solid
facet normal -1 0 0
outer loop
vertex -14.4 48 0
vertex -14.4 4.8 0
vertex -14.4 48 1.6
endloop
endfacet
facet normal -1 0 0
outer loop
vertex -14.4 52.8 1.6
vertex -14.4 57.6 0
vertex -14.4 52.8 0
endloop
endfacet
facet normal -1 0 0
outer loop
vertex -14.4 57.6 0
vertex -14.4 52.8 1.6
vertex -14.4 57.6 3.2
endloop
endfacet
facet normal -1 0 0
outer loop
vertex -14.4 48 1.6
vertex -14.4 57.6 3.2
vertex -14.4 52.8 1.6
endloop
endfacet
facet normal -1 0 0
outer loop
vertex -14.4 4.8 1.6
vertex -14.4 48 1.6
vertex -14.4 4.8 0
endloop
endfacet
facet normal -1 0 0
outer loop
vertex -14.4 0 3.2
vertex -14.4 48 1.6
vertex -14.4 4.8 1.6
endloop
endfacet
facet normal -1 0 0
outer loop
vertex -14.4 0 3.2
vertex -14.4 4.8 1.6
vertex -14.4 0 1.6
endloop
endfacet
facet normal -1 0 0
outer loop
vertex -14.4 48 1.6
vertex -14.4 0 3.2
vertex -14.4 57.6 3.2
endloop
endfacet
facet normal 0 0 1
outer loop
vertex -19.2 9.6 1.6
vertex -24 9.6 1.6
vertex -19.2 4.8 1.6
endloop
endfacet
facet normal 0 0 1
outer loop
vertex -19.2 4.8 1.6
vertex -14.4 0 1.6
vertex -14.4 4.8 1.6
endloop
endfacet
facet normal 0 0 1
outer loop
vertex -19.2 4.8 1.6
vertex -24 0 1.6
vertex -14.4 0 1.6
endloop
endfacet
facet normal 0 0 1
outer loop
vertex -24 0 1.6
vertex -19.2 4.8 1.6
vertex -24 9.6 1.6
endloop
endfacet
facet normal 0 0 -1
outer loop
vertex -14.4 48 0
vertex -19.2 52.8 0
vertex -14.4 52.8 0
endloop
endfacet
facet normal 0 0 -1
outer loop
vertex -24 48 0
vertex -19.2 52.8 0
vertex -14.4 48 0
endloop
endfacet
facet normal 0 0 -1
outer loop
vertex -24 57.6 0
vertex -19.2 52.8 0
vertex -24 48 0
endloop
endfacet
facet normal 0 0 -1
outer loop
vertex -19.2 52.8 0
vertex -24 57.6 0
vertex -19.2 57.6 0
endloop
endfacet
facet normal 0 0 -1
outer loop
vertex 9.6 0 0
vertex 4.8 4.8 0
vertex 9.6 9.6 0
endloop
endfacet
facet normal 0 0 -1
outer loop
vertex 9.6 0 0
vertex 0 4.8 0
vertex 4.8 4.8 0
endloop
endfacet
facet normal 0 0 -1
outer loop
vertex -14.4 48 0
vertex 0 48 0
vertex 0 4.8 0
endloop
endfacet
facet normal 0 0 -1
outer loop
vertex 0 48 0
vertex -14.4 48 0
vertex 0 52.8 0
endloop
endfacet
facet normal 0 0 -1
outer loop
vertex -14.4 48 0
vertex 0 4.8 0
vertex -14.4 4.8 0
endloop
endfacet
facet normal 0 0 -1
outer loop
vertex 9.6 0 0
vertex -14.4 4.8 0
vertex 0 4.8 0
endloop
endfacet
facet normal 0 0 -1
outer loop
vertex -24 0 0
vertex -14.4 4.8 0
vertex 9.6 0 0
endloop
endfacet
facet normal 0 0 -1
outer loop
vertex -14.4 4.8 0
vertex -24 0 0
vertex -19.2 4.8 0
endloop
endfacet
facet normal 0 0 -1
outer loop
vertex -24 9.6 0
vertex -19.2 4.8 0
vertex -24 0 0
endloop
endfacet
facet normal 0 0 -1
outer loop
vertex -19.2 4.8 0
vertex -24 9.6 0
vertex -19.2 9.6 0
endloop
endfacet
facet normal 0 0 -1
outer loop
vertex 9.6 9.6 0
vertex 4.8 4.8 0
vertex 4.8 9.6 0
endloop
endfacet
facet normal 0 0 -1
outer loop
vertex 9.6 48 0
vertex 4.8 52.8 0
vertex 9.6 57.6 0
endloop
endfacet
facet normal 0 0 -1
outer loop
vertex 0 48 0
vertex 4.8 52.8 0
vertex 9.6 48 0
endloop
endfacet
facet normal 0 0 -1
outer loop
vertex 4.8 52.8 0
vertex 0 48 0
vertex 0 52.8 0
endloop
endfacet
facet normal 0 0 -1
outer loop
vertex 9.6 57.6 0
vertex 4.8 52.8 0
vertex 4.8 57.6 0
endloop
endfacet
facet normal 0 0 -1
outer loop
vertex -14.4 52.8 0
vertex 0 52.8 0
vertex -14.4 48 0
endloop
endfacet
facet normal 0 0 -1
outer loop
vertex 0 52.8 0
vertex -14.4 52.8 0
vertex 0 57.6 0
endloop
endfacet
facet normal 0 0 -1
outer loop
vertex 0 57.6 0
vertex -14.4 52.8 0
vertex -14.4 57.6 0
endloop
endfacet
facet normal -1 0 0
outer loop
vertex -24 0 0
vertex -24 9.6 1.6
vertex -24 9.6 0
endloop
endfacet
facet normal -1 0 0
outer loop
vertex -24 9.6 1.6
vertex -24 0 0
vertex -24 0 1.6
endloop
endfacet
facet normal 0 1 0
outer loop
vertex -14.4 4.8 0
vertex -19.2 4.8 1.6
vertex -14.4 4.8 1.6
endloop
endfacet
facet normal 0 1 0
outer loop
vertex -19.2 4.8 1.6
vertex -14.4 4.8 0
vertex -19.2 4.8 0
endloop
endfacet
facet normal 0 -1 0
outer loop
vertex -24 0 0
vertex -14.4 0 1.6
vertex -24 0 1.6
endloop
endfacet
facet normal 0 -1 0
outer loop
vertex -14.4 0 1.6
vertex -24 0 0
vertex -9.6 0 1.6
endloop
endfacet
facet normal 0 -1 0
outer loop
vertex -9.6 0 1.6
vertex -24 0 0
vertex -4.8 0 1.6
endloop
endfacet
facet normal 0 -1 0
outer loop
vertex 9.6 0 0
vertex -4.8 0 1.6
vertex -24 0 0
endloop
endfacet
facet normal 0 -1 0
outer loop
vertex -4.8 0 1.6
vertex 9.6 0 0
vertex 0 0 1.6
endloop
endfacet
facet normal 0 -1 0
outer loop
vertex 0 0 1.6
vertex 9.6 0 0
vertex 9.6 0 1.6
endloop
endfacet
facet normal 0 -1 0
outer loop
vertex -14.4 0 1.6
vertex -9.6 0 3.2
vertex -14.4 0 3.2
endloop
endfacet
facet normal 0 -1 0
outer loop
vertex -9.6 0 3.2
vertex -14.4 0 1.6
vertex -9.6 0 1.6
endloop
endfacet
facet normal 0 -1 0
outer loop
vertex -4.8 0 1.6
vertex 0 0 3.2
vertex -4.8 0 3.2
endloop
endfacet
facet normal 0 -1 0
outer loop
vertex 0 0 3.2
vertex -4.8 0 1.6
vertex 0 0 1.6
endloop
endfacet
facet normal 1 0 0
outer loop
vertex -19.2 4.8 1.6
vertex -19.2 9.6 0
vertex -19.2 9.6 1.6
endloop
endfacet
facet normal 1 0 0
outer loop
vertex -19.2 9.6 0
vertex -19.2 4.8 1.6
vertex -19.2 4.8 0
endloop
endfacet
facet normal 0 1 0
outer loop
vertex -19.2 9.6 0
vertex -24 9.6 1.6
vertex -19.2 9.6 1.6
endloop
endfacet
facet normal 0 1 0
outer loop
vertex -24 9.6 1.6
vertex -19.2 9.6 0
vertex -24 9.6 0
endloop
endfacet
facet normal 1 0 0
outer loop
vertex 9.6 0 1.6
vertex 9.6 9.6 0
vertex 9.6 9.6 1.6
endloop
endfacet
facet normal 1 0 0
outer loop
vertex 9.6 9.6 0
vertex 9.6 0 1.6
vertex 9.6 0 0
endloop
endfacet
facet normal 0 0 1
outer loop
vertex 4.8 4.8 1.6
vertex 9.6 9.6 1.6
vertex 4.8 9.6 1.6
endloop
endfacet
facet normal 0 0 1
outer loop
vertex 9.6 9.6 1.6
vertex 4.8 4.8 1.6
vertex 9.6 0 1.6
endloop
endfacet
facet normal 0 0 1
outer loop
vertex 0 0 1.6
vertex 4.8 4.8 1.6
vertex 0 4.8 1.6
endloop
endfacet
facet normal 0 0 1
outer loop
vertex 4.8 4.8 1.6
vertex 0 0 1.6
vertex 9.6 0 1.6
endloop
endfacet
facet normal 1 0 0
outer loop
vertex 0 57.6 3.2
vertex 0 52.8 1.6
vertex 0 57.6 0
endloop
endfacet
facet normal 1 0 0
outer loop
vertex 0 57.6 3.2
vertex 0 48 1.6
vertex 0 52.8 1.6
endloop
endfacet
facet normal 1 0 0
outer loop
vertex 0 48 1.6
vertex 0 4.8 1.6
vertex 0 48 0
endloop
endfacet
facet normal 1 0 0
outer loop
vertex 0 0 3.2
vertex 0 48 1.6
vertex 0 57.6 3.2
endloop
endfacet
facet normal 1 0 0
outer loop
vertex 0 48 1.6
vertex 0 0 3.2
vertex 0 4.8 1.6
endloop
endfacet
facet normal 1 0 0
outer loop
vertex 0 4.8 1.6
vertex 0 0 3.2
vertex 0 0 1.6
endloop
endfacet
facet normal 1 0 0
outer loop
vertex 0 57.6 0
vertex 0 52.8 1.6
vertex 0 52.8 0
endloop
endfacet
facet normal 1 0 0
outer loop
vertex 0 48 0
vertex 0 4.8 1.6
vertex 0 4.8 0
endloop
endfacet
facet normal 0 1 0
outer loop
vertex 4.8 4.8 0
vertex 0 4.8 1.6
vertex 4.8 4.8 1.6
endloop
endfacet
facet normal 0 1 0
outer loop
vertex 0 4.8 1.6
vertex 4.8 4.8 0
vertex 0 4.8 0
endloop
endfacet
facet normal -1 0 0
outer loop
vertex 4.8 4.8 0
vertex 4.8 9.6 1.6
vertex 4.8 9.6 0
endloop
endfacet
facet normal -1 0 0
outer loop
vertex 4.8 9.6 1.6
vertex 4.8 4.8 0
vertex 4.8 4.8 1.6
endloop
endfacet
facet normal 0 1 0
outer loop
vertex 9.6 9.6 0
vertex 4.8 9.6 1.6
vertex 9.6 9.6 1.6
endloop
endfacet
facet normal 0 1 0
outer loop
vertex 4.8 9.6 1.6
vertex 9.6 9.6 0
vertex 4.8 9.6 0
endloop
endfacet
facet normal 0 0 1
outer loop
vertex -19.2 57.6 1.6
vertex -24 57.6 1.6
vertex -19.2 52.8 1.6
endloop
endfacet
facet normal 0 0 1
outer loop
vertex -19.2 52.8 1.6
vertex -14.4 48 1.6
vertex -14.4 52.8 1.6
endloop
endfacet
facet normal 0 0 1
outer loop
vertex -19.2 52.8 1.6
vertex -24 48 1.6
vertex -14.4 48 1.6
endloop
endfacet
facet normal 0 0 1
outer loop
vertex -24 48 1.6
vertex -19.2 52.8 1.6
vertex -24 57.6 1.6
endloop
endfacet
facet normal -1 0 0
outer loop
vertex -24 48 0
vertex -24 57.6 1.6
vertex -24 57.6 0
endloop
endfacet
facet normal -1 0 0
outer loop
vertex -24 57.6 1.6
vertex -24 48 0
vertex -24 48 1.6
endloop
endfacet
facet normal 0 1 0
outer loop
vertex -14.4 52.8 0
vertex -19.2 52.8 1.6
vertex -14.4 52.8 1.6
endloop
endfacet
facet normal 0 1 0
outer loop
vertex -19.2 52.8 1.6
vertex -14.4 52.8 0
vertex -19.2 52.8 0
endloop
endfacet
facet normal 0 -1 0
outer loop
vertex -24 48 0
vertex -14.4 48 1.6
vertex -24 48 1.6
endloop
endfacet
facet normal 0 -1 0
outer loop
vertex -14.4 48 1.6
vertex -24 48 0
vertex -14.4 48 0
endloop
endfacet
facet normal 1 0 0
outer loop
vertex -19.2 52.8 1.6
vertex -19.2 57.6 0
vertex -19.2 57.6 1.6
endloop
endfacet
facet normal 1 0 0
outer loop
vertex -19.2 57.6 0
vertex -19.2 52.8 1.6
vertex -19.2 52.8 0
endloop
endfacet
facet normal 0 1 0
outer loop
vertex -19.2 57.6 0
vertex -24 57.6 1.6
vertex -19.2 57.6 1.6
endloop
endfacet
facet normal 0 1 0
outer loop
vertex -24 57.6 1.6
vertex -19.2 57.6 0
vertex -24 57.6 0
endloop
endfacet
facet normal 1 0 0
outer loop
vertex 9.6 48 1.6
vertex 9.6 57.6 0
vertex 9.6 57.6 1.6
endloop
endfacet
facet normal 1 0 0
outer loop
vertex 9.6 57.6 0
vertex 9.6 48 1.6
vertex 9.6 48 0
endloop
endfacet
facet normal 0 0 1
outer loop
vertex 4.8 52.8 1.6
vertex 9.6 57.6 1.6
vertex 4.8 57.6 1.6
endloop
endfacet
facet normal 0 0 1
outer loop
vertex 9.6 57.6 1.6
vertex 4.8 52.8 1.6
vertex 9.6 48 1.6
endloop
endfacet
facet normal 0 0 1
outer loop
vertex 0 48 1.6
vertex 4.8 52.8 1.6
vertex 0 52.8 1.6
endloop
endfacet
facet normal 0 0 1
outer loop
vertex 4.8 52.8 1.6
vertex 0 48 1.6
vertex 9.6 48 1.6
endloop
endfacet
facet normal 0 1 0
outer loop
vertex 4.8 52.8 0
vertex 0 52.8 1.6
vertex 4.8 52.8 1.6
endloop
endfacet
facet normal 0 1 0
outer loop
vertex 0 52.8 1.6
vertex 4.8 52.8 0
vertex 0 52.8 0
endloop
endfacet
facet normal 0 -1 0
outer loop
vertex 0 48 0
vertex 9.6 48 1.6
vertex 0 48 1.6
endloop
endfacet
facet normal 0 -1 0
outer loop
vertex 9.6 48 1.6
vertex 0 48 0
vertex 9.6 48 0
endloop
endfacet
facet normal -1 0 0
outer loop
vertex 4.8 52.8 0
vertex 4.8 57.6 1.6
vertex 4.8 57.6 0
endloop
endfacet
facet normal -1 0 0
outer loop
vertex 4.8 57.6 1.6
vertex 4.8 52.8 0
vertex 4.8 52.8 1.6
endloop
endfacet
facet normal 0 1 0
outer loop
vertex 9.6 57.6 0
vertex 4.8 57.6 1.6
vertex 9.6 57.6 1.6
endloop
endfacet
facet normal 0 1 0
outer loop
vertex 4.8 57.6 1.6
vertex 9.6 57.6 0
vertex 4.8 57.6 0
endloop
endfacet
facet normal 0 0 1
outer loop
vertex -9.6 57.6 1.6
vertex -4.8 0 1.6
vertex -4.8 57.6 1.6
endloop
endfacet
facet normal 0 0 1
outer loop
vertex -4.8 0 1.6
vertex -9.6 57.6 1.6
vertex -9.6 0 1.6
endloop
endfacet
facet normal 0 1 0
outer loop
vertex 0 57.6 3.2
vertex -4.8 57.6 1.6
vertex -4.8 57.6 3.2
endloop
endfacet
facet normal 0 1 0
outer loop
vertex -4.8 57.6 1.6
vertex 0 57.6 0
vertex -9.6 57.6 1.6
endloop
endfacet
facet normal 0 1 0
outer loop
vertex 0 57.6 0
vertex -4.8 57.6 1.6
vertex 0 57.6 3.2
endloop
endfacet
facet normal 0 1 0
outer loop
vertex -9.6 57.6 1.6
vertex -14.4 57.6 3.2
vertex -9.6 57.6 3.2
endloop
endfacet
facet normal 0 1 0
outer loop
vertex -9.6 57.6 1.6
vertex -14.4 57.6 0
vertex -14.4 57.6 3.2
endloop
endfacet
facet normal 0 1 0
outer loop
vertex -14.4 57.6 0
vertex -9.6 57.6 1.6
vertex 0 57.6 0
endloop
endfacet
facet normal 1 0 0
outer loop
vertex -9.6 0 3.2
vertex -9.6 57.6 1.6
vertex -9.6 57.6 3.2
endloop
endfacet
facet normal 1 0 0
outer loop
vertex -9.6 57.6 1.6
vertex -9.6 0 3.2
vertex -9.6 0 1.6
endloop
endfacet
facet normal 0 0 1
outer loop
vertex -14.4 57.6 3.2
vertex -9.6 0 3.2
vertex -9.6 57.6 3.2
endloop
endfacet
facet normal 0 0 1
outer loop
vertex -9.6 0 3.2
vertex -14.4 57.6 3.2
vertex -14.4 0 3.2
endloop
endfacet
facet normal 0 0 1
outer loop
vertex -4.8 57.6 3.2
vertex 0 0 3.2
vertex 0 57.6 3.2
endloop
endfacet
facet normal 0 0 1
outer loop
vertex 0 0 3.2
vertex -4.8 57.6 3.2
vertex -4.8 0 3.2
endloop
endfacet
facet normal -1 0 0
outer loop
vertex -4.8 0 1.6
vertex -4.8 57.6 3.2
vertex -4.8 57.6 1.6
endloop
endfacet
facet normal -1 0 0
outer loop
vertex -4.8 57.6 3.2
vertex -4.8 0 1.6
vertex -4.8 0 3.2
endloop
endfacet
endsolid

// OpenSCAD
// file: myCylinder.scad
// Copyright Stephen Morrisson 2017
// All rights reserved

// rh Cent Cylinder
// rh Cylinder
use <myCube.scad>

module rhCentCylinder(c, rRadius, z)
{
    color(c) cylinder(h=z, r=rRadius, center=false);
}
translate([-15, -15, 0]) rhCentCylinder("red", 3, 2);

module rhCylinder(c, rRadius, z)
{
    translate([rRadius, rRadius, 0]) rhCentCylinder(c, rRadius, z);
}
translate([-15, 15, 0]) rhCylinder("blue", 2, 3);

module transCylinder(c, xO, yO, zO, rRadius, z)
{
    translate([xO, yO, zO]) rhCylinder(c, rRadius, z);
}
//transCylinder("red", 0,0,0, 4, 1);
transCylinder("green", 15, 15, 0, 2, 2);

module centRightCylinder(c, rRadius, z)
{
    rD = rRadius * 3.0;
    difference()
    {
        rhCentCylinder(c, rRadius, z);
        transCube(c, -rD, -rRadius, -rRadius,  rD, rD, rD);
    }
}
centRightCylinder("green", 2, 2);

module rightHalfCylinder(c, xO, yO, zO, rRadius, z)
{
    translate([xO, yO + rRadius, zO]) centRightCylinder(c, rRadius, z);
}
rightHalfCylinder("yellow", 10, 0, 0, 2, 1);

module leftHalfCylinder(c, xO, yO, zO, rRadius, z)
{
    translate([xO + rRadius, yO + rRadius, zO])
        rotate([0,0,180]) centRightCylinder(c, rRadius, z);
}
leftHalfCylinder("yellow", -10, 0, 0, 2, 1);

module topHalfCylinder(c, xO, yO, zO, rRadius, z)
{
    translate([xO + rRadius, yO, zO])
        rotate([0,0,90]) centRightCylinder(c, rRadius, z);
}
topHalfCylinder("yellow", 0, 10, 0, 2, 1);

module bottomHalfCylinder(c, xO, yO, zO, rRadius, z)
{
    translate([xO + rRadius, yO + rRadius, zO])
        rotate([0,0,270]) centRightCylinder(c, rRadius, z);
}
bottomHalfCylinder("yellow", 0, -10, 0, 2, 1);
// file: myBaseParts.scad
// Copyright Stephen Morrisson 2017
// All rights reserved

// {xyz, trans, rot} UBar


use <myCube.scad>
use <myCylinder.scad>



module xyzUBar(cB, cL, cR, xBase, yBase, zBase, 
    xLeft, zLeft, xRight, zRight)
{
    xyzCube(cB, xBase, yBase, zBase);
    transCube(cL, 0, 0, zBase, xLeft, yBase, zLeft);
    transCube(cR, xBase - xRight, 0, zBase, xRight, yBase, zRight);
}

xyzUBar("red", "green", "blue", 10, 14, 1, 2, 3, 4, 5);

module transUBar(c, xO, yO, zO, xB, yB, zB, xL, zL, xR, zR)
{
    translate([xO, yO, zO]) xyzUBar(c, c, c, xB, yB, zB, xL, zL, xR, zR);
}
//transUBar("orange", -10, -10, -1,  4, 2, 1, 1, 1, 2, 2);


module rotUBar(c, rotX, rotY, rotZ, xO, yO, zO,
    xB, yB, zB, xL, zL, xR, zR)
{
    rotate([rotX, rotY, rotZ]) transUBar(c, xO, yO, zO, xB, yB, zB,
        xL, zL, xR, zR);
}
rotUBar("orange", 90, 180, 270, -10, -10, -1,  4, 2, 1, 1, 1, 2, 2);
// file: Flang.scad
// Copyright Stephen Morrisson 2017
// All rights reserved

// Tab Flang

use <myCube.scad>
use <myCylinder.scad>

module rightSimpleTab(c, rRadius, z, xSpacer)
{
    yD = 2.0 * rRadius;
    xyzCube(c, xSpacer, yD, z);
    rightHalfCylinder(c, xSpacer, 0, 0, rRadius, z);
}

module rightTab(c, xO, yO, zO, rRadius, z, xSpacer)
{
    translate([xO, yO, zO])
    {
        rightSimpleTab(c, rRadius, z, xSpacer);
    }
}
rightTab("blue", 10, 0, 0, 3, 1, 4);

module rightFlang(c, xO, yO, zO, rRadius, z, xSpacer, rHole)
{
    rMid = rRadius - rHole;
    difference()
    {
        rightTab(c, xO, yO, zO, rRadius, z, xSpacer);
        transCylinder(c, xO + xSpacer - rRadius, yO + rMid, zO -1,
            rHole, z + 2.0); 
    }
}
rightFlang("green", 20,0,0, 3, 1, 4, 2);

module leftTab(c, xO, yO, zO, rRadius, z, xSpacer)
{
    mirror([1, 0, 0]) rightTab(c, -xO, yO, zO, rRadius, z, xSpacer);
}
leftTab("blue", -10,0,0, 3, 1, 4);

module leftFlang(c, xO, yO, zO, rRadius, z, xSpacer, rHole)
{
    mirror([1, 0, 0])
        rightFlang(c, -xO, yO, zO, rRadius, z, xSpacer, rHole);
}
leftFlang("green", -20,0,0, 3, 1, 4, 1);
// file: myCube.scad
// Copyright Stephen Morrisson 2017
// All rights reserved

// {xyz, rot, trans, tr} Cube

module xyzCube(c, x, y, z)
{
    color(c) cube([x, y, z], false);
}

module rotCube(c, rotX, rotY, rotZ, x, y, z)
{
    rotate([rotX, rotY, rotZ]) xyzCube(c, x, y, z);
}
translate([-15, 15, 0,])rotCube("green", 45, 45, 45, 2,2,2);

module transCube(c, xOffset, yOffset, zOffset, x, y, z)
{
    translate([xOffset, yOffset, zOffset]) xyzCube(c, x, y, z);
}
transCube("brown", -15, -15, 0, 3, 2, 1);


module trCube(c, rotX, rotY, rotZ, xO, yO, zO, x, y, z)
{
    translate([xO, yO, zO])
    rotate([rotX, rotY, rotZ])
    xyzCube(c, x, y, z);
}
//trCube("yellow", 0,0,0, 0,0,0, 2, 3, 4);
//trCube("green", 45, 45, 45, 4, 3, 1, 5, 6, 7);
//trCube("blue", 0, 0, 45, 20, 0, 0, 5, 6, 7);
trCube("orange", 0,0,0, -10, 0, 0, 1,1,1);
//trCube("orange", 45,0,0, -15, 0, 0, 1,1,1);
//trCube("orange", 0,45,0, -20, 0, 0, 1,1,1);
//trCube("orange", 0,0,45, -25, 0, 0, 1,1,1);
// main file
// Copyright Stephen Morrisson 2017
// All rights reserved

//  Loom Frame

use <myCube.scad>
use <Flang.scad>
use <myBaseParts.scad>

module LoomFrame1(c, xO, yO, zO, y)
{
    transCenterUpright("green", xO, yO, zO, y);
}
//LoomFrame1("red", 0,0,0,  12);

module transLeftHangerSupport(c, xO, yO, zO)
{
    translate([xO, yO, zO])
    {
        transCube(c, 0, 0, 0, 2.0, 1, 1);
        transCube(c, 0, 1, 0, 1, 1, 1);
    }
}
module transRightHangerSupport(c, xO, yO, zO)
{
    translate([xO, yO, zO])
    {
        //transCube("red", 0,0,0, 1,1,1);
        transCube(c, 0, 0, 0, 2.0, 1, 1);
        transCube(c, 1, 1, 0, 1, 1, 1);
    }
}

module CenterUpright(c, yB)
{
    transLeftHangerSupport(c, 0, 0, 0);
    transRightHangerSupport(c, 5, 0,0);
    
    transLeftHangerSupport(c, 0, yB - 2, 0);
    transRightHangerSupport(c, 5, yB - 2,0);
    
    transUBar(c, 2, 0, 0, 3, yB, 1, 1, 1, 1, 1);
} 

module transCenterUpright(c, xO, yO, zO, yB)
{
    translate([xO,yO,zO]) CenterUpright(c, yB);
}

scale([3, 3, 1])
scale([1.6,1.6,1.6]) transCenterUpright("green", -5,0,0, 12);
//transCenterUpright("blue", 0,0,0, 12);
